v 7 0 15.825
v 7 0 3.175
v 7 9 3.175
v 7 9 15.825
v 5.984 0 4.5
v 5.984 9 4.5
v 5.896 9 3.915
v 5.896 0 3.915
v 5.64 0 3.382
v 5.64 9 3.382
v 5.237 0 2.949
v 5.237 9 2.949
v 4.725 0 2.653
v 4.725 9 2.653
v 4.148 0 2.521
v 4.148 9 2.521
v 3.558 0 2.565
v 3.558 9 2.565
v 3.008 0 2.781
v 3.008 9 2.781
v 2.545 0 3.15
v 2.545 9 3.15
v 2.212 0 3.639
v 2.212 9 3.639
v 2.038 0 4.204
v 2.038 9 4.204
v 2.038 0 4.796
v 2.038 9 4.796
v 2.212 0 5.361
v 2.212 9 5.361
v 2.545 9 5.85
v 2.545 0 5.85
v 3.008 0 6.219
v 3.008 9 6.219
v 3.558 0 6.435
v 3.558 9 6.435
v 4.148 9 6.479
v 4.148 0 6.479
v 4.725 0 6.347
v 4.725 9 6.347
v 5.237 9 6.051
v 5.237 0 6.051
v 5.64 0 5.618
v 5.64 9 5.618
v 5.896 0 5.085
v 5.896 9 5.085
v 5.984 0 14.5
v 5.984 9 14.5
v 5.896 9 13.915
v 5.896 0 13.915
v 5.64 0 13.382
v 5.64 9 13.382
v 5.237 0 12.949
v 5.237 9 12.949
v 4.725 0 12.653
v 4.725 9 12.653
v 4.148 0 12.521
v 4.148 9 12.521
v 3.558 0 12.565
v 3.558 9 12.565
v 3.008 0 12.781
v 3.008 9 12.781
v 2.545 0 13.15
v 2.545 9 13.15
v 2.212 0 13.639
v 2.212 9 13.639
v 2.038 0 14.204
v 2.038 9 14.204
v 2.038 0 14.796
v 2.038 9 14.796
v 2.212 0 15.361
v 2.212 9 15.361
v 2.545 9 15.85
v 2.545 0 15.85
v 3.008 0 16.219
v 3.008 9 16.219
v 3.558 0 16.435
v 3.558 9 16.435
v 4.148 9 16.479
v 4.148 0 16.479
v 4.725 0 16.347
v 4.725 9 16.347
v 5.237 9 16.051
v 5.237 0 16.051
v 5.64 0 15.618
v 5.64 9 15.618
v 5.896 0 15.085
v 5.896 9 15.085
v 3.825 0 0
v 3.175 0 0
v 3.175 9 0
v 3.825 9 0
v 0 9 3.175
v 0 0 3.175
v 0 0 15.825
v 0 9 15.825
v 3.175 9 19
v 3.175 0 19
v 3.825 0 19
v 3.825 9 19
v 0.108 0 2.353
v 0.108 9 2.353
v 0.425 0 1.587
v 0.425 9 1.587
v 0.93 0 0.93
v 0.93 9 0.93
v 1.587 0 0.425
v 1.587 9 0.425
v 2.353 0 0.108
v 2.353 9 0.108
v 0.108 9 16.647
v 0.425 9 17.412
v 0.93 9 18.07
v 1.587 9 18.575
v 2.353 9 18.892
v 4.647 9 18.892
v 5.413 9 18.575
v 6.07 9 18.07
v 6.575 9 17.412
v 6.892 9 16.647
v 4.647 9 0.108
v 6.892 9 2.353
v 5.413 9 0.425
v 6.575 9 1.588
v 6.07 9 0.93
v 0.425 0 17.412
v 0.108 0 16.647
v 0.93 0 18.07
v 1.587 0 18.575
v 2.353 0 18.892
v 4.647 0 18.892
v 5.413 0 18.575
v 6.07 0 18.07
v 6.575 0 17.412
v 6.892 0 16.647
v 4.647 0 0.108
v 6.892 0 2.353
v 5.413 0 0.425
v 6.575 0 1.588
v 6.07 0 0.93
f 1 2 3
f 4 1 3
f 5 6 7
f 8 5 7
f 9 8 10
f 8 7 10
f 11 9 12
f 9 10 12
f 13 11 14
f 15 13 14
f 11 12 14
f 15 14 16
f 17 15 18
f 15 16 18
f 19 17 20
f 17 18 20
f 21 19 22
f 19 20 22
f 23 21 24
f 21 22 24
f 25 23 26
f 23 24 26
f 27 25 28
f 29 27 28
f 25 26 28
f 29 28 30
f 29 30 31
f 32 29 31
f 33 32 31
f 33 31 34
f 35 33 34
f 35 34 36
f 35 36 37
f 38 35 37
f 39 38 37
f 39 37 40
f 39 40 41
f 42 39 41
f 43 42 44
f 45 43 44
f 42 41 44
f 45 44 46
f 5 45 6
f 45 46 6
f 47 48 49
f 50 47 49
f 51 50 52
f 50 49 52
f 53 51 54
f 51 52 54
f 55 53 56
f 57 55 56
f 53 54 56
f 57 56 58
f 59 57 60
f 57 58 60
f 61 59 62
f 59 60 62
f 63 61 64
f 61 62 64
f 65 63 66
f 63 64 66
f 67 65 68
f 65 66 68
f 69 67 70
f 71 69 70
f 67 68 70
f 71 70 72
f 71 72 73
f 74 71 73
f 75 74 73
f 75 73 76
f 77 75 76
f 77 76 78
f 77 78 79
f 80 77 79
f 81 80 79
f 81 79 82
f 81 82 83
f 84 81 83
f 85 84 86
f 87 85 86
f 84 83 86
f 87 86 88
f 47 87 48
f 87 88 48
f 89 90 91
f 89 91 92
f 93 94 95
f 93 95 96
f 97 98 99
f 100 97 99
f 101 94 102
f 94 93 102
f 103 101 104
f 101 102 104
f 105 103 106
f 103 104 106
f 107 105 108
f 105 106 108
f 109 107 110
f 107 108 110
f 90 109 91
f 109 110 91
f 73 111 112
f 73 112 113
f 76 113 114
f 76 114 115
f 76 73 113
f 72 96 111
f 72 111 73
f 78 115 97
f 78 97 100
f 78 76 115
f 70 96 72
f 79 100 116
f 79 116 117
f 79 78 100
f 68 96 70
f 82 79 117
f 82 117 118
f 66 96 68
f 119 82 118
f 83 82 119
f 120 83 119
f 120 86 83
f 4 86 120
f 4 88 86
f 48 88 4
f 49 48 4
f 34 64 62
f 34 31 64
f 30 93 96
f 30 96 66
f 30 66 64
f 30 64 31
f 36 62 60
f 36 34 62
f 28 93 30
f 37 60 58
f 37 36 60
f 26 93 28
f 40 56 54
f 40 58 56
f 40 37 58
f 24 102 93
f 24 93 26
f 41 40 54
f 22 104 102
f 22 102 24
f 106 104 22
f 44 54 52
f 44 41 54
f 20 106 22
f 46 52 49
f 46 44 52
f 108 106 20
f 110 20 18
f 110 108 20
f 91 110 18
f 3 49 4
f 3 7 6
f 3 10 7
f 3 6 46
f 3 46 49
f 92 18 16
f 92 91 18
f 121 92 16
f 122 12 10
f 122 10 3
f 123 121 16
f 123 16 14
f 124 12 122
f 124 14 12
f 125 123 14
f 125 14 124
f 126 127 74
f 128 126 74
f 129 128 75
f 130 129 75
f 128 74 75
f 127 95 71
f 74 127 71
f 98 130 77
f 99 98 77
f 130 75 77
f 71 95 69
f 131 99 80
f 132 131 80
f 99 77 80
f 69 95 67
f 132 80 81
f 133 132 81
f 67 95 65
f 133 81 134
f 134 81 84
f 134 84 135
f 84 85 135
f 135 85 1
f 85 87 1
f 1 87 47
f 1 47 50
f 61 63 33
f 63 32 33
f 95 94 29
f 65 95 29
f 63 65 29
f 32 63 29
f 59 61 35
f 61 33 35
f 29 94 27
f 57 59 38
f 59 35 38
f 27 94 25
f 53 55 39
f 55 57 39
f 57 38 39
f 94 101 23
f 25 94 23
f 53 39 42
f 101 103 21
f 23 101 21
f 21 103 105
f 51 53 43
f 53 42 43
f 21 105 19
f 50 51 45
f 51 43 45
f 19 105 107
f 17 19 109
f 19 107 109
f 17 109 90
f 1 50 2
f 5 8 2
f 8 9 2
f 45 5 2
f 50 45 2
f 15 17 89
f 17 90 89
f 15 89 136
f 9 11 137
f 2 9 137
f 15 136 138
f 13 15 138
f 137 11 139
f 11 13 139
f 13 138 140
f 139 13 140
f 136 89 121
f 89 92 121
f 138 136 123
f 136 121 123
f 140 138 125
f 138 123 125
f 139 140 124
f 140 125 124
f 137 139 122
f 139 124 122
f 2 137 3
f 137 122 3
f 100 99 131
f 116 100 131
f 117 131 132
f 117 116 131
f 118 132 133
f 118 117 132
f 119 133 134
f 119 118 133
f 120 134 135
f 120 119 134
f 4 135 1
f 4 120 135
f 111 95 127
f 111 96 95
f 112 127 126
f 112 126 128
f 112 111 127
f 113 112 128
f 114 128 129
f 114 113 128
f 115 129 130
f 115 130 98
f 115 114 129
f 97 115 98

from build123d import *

# Parameters (mm, degrees)
SKETCH1_W           = 7
SKETCH1_H           = 9
BOSS_EXTRUDE1_DEPTH = 19
SKETCH2_R           = 1.984375
CUT_EXTRUDE1_DEPTH  = 9
FILLET1_R           = 3.175


with BuildPart() as part:
    # Sketch1 → Boss-Extrude1 (new body)
    with BuildSketch(Plane.XY):
        with Locations((3.5, 4.5)):
            Rectangle(SKETCH1_W, SKETCH1_H)
    extrude(amount=BOSS_EXTRUDE1_DEPTH)

    # Sketch2 → Cut-Extrude1 (cut)
    with BuildSketch(Plane(origin=(0, 9, 0), x_dir=(1, 0, 0), z_dir=(0, 1, 0))):
        with Locations((4, -4.5)):
            Circle(SKETCH2_R)
        with Locations((4, -14.5)):
            Circle(SKETCH2_R)
    extrude(amount=-CUT_EXTRUDE1_DEPTH, mode=Mode.SUBTRACT)

    # Fillet1
    fillet1_edges = [part.edges().sort_by_distance(p)[0] for p in [
        (7, 4.5, 19),
        (0, 4.5, 19),
        (7, 4.5, 0),
        (0, 4.5, 0),
    ]]
    fillet(fillet1_edges, radius=FILLET1_R)


solid = part.part
